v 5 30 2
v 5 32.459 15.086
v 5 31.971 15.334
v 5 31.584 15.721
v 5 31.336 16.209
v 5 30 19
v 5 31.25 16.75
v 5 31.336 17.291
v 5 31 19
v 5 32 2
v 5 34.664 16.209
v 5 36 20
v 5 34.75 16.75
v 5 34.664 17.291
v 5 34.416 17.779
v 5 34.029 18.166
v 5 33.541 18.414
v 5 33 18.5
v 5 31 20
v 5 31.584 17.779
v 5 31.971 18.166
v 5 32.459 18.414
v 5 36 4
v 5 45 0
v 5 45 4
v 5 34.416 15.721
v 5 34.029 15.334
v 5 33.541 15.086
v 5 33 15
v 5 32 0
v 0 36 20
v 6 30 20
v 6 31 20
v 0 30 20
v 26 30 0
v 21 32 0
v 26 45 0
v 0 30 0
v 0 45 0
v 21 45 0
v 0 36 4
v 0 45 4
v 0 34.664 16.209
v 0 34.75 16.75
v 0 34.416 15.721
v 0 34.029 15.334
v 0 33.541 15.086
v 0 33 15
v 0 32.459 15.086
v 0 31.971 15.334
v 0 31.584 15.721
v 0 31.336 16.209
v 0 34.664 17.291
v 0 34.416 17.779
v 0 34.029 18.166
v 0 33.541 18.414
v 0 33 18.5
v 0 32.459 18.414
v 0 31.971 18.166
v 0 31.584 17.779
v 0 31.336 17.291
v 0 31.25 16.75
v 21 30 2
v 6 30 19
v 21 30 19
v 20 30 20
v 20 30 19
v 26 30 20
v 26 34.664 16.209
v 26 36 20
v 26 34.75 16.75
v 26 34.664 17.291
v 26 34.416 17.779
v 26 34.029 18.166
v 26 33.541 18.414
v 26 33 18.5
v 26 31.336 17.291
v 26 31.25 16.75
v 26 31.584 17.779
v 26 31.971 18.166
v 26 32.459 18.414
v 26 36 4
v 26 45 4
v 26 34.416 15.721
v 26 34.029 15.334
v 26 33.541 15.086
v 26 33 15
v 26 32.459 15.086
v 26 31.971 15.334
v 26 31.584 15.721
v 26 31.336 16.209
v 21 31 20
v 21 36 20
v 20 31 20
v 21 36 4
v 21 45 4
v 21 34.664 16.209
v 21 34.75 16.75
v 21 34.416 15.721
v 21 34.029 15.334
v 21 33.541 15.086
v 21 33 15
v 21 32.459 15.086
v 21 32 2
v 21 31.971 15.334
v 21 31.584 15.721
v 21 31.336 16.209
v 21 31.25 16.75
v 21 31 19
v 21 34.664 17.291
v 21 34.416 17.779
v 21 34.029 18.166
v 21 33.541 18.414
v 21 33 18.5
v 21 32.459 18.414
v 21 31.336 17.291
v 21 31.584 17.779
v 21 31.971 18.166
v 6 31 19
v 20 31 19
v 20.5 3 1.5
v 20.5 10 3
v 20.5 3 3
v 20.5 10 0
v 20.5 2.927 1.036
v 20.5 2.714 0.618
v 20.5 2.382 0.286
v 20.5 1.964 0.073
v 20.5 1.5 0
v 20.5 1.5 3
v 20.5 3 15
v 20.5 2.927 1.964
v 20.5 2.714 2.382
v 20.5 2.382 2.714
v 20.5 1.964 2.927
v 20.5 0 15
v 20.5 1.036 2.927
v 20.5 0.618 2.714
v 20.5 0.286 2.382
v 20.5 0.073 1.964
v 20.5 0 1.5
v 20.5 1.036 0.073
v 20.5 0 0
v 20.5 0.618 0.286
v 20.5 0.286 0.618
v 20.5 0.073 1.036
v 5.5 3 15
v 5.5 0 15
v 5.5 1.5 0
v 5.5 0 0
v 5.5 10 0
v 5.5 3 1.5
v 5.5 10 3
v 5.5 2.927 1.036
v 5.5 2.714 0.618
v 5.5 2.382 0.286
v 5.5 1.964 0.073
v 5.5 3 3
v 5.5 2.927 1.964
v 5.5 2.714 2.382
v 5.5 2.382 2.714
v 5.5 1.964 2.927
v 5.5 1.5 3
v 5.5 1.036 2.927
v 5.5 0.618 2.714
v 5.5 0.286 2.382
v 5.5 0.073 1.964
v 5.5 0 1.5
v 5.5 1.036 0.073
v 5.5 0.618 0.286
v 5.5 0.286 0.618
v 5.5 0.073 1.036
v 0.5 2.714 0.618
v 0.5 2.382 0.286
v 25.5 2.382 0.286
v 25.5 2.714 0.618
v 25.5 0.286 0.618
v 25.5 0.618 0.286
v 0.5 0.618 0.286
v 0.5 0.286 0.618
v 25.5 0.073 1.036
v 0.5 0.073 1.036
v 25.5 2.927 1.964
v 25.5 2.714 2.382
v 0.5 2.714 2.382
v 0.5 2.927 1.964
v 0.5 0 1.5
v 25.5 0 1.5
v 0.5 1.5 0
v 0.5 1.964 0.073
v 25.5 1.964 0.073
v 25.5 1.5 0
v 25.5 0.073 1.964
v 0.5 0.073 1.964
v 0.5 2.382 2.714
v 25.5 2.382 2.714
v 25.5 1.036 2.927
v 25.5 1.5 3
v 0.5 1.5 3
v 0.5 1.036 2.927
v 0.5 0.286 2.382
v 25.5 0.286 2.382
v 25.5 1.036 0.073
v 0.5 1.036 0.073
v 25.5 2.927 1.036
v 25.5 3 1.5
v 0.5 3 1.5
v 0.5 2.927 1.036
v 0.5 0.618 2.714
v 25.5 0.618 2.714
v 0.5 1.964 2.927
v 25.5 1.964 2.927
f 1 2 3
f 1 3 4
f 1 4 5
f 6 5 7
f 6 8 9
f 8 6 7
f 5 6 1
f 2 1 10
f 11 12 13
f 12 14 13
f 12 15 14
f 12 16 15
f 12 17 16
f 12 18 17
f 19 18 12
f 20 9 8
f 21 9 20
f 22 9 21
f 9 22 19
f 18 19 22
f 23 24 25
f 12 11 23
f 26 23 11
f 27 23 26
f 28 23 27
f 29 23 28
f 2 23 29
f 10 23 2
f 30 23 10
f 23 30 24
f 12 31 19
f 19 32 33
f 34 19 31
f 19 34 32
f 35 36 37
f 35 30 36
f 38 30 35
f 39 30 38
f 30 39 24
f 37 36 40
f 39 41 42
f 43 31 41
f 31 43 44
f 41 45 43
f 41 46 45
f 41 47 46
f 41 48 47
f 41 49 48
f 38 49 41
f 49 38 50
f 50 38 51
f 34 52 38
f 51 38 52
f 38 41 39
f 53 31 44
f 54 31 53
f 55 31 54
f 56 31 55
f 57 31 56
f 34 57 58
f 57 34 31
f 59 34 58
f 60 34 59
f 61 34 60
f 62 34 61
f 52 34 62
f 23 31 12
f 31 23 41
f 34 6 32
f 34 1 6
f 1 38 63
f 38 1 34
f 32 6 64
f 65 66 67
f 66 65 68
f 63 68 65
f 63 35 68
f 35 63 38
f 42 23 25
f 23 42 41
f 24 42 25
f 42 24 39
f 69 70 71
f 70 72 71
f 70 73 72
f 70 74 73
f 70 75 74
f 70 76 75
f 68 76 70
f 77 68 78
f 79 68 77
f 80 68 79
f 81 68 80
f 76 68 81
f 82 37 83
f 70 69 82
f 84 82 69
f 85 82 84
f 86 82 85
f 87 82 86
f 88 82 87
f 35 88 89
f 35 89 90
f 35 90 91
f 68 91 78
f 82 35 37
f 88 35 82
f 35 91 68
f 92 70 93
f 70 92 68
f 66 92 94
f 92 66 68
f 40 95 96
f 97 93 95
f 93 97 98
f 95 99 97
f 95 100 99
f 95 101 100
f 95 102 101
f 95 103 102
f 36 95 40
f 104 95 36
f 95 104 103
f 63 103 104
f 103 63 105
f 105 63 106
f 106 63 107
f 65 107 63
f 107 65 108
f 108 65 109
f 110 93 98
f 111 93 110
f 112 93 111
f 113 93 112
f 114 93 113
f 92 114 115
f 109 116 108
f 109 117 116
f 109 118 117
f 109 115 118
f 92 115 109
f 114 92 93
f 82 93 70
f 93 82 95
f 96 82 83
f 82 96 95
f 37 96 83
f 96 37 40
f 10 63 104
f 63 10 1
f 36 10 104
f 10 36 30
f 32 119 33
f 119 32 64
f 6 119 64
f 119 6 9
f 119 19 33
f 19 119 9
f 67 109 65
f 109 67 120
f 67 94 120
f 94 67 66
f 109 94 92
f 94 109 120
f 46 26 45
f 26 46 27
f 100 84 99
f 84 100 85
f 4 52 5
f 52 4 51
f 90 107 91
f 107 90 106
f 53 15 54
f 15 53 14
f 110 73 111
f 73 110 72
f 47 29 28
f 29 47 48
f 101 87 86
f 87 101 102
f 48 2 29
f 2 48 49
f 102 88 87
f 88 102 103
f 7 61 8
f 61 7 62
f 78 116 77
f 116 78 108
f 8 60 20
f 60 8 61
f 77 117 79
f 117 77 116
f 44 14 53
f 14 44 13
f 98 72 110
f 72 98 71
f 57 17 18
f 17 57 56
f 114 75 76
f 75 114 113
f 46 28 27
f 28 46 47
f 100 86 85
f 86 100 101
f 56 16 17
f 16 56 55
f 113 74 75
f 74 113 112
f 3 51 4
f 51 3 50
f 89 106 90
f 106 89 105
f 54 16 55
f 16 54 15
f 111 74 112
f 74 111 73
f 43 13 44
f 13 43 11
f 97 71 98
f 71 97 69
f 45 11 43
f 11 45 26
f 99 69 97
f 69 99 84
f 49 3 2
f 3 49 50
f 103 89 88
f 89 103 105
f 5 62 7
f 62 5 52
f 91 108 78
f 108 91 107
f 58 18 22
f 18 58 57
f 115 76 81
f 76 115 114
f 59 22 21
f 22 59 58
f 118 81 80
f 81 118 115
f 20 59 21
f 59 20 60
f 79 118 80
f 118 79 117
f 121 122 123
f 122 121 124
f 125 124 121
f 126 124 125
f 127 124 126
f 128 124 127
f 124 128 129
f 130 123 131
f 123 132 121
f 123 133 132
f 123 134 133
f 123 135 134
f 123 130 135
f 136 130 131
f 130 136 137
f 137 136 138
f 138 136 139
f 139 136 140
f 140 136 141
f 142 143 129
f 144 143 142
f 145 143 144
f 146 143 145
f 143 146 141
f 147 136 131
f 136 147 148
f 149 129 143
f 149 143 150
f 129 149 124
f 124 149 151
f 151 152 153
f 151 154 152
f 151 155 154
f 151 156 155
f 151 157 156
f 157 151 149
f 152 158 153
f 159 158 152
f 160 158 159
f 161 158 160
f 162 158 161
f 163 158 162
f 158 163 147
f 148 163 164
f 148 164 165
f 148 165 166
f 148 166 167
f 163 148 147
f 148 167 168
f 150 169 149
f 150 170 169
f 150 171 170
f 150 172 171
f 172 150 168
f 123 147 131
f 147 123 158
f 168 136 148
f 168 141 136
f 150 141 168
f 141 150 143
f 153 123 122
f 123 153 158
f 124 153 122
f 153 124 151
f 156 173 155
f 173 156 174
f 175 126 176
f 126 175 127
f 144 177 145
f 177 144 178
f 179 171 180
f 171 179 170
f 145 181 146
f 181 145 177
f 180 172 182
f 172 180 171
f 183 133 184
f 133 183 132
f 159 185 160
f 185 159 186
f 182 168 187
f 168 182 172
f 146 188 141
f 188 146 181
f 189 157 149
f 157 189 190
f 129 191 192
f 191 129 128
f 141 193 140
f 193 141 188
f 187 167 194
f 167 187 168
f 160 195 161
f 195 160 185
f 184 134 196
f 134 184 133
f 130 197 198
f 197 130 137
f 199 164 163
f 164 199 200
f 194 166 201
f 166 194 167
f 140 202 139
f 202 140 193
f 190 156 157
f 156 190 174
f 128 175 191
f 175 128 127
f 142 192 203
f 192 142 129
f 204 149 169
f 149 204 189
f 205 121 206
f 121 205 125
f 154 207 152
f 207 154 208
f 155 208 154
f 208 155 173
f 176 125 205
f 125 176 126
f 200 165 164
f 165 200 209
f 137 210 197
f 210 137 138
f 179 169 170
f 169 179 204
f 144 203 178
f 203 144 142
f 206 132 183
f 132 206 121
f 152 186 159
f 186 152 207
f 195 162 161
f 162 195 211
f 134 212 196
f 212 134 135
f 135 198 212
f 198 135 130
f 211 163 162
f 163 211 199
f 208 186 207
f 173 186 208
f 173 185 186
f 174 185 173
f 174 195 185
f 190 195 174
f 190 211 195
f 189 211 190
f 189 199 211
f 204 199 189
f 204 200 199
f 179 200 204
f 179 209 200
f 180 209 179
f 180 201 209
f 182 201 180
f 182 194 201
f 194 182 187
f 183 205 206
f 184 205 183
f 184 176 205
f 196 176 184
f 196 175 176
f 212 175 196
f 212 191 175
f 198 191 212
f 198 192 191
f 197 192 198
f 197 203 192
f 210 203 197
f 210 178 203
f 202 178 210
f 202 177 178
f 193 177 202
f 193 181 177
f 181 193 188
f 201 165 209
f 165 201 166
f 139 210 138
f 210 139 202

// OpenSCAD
// I know OpenSCAD makes no sense, but it works for modifying things programmatically!
// Measurements are intended to represent mm.
// I will comment this more and improve as I go

$fn=20;
overall_height = 36;

paddle_position_height  = 11;

paddle_height = overall_height-paddle_position_height;
paddle_width  = 19;
paddle_depth  = 3;

post_diameter = 1.718;
post_distance = 10.76;

flapper_height = paddle_depth;
flapper_width  = paddle_width;
flapper_depth  = 40;

axel_inner_diameter = 4;
axel_outer_diameter = 10;
axel_depth  = 50;

bearing_width  = 4;
bearing_depth  = axel_outer_diameter;

part_gap  = .5;
push_button_height = 4;
axel_opening = 10;

axel_wall_thickness =((axel_outer_diameter/2)-(axel_inner_diameter/2));
base_height = 5;
base_width  = paddle_width+(bearing_width*2+part_gap*2);
base_depth  = 19;

// the joined base for the paddle to rotate within.
translate([0,30,0]) {
    difference() {
        union() {
            union() {
                #cube([5,6,20]);
                cube([5,15,4]);
            };
            translate([21,0,0]) {
                    union() {
                        cube([5,6,20]);
                        cube([5,15,4]);
                };
            };
            cube([21,2,2]);
            translate([0,0,19]) {
                cube([6,1,1]);
            };
            translate([20,0,19]) {
                cube([6,1,1]);
            };
        };
        translate([-5, 3, (3.5/2)+15]) {
            rotate([0, 90, 0]) {
                cylinder(d=3.5, h=55);
            };
    };
    };
};

// this is the fitted paddle
translate([5.5,0,0]) {
    #union(){
        //translate([bearing_width+part_gap,  axel_wall_thickness, paddle_position_height]) {
            union(){
                cube([15,3,15]);
                cube([15,10,3]);
            };
        //};
        translate([-5,  1.5, 1.5]) {
            rotate([0, 90, 0]) {
                cylinder(d=3, h=25);
            };
        };
    };
};
